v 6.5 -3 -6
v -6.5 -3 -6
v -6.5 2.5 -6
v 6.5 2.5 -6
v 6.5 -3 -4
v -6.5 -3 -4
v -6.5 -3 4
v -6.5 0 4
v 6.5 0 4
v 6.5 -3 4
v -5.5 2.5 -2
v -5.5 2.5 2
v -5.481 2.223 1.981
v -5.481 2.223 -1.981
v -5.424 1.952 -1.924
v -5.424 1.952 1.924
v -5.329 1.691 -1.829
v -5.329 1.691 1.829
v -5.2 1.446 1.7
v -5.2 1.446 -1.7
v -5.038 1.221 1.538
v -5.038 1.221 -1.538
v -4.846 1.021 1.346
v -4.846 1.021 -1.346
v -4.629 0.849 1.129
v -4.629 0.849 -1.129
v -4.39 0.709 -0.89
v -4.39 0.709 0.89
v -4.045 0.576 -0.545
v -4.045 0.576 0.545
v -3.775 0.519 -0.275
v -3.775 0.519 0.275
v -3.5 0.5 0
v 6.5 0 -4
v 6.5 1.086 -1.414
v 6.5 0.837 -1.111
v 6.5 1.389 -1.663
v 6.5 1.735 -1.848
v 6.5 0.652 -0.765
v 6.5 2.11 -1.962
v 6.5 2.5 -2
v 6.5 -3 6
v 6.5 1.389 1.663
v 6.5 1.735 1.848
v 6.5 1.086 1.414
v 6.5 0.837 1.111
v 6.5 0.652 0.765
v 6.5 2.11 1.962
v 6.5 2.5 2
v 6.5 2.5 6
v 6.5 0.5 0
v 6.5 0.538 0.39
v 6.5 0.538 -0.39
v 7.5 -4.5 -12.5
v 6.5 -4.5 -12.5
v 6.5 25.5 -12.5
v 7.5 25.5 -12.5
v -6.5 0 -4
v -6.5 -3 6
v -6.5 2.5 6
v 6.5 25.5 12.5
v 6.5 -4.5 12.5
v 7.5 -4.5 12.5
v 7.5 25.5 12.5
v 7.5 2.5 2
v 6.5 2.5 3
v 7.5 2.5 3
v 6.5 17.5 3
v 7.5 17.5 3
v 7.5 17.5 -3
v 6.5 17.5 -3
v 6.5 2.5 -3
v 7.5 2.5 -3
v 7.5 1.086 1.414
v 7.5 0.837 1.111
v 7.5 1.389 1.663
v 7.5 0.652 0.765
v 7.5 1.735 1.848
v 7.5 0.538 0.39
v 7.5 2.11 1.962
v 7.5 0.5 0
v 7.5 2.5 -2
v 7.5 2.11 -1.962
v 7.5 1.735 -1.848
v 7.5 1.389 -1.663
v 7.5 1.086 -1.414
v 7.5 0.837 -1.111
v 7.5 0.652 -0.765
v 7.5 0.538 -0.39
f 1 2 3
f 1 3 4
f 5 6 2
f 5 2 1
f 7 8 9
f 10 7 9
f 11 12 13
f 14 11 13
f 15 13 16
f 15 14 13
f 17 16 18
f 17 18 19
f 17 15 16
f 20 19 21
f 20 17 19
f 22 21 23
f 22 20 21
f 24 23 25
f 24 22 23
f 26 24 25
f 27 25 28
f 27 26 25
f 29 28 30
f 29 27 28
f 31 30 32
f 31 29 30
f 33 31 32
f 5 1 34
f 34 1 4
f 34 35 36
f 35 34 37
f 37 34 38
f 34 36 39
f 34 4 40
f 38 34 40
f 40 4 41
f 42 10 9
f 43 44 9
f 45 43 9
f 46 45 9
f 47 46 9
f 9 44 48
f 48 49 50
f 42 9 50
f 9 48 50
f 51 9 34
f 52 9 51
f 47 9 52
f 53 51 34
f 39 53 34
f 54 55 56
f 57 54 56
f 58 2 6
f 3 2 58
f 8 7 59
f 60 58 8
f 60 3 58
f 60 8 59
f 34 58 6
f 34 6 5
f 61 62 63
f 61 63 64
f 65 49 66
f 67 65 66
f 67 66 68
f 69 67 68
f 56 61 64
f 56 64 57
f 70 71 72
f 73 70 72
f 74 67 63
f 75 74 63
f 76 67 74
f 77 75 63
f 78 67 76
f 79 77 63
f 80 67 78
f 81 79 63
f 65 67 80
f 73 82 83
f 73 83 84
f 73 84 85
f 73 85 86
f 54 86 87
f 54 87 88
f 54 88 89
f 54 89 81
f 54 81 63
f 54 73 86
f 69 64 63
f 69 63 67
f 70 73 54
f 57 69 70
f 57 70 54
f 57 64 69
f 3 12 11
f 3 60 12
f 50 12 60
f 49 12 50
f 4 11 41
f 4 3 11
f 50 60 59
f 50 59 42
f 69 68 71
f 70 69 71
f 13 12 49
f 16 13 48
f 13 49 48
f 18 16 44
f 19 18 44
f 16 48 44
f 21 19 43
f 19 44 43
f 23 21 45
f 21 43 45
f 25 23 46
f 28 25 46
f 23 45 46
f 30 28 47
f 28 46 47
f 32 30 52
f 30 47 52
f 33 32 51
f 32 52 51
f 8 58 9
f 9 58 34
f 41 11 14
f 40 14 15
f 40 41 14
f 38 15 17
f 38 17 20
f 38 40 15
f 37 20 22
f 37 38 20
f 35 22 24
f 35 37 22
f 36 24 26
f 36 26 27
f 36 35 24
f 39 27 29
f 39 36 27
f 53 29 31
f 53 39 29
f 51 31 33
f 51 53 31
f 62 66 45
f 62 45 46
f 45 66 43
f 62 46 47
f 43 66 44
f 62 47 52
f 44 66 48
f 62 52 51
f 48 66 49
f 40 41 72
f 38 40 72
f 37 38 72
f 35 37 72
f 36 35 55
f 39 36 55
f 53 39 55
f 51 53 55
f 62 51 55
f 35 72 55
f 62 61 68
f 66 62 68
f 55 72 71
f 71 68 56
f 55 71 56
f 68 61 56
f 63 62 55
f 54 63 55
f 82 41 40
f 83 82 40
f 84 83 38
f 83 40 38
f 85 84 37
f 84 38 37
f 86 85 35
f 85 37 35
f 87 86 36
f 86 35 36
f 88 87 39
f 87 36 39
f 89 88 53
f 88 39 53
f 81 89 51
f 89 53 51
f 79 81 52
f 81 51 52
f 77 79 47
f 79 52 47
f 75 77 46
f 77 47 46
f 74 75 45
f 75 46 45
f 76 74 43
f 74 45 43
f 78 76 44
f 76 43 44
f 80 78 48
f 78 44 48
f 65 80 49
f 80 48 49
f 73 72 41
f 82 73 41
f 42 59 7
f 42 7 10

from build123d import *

# Parameters (mm, degrees)
SKETCH1_W           = 13
SKETCH1_H           = 12
BOSS_EXTRUDE1_DEPTH = 2.5
SKETCH2_W           = 13
SKETCH2_H           = 2
BOSS_EXTRUDE2_DEPTH = 3
SKETCH3_W           = 12
SKETCH3_H           = 4
CUT_EXTRUDE2_DEPTH  = 2
FILLET1_R           = 2
SKETCH4_W           = 25
SKETCH4_H           = 30
BOSS_EXTRUDE5_DEPTH = 1


with BuildPart() as part:
    # Sketch1 → Boss-Extrude1 (new body)
    with BuildSketch(Plane(origin=(0, 0, 0), x_dir=(1, 0, 0), z_dir=(0, 1, 0))):
        Rectangle(SKETCH1_W, SKETCH1_H)
    extrude(amount=BOSS_EXTRUDE1_DEPTH)

    # Sketch2 → Boss-Extrude2 (add)
    with BuildSketch(Plane.XZ):
        with Locations((0, 5)):
            Rectangle(SKETCH2_W, SKETCH2_H)
        with Locations((0, -5)):
            Rectangle(SKETCH2_W, SKETCH2_H)
    extrude(amount=BOSS_EXTRUDE2_DEPTH)

    # Sketch3 → Cut-Extrude2 (cut)
    with BuildSketch(Plane(origin=(0, 2.5, 0), x_dir=(1, 0, 0), z_dir=(0, 1, 0))):
        with Locations((0.5, 0)):
            Rectangle(SKETCH3_W, SKETCH3_H)
    extrude(amount=-CUT_EXTRUDE2_DEPTH, mode=Mode.SUBTRACT)

    # Fillet1
    fillet1_edges = [part.edges().sort_by_distance(p)[0] for p in [
        (0.5, 0.5, 2),
        (0.5, 0.5, -2),
        (-5.5, 0.5, 0),
    ]]
    fillet(fillet1_edges, radius=FILLET1_R - 0.0001)  # a hair under: the kernel refuses the full size


with BuildPart() as body_2:
    # Sketch4 → Boss-Extrude5 (new body)
    with BuildSketch(Plane(origin=(6.5, 0, 0), x_dir=(0, 0, -1), z_dir=(1, 0, 0))):
        with Locations((0, 10.5)):
            Rectangle(SKETCH4_W, SKETCH4_H)
        with BuildLine():
            Line((-3, 2.5), (-3, 17.5))
            Line((-3, 17.5), (3, 17.5))
            Line((3, 17.5), (3, 2.5))
            Line((3, 2.5), (2, 2.5))
            ThreePointArc((2, 2.5), (0, 0.5), (-2, 2.5))
            Line((-2, 2.5), (-3, 2.5))
        make_face(mode=Mode.SUBTRACT)
    extrude(amount=BOSS_EXTRUDE5_DEPTH)


solid = Compound([part.part, body_2.part])
